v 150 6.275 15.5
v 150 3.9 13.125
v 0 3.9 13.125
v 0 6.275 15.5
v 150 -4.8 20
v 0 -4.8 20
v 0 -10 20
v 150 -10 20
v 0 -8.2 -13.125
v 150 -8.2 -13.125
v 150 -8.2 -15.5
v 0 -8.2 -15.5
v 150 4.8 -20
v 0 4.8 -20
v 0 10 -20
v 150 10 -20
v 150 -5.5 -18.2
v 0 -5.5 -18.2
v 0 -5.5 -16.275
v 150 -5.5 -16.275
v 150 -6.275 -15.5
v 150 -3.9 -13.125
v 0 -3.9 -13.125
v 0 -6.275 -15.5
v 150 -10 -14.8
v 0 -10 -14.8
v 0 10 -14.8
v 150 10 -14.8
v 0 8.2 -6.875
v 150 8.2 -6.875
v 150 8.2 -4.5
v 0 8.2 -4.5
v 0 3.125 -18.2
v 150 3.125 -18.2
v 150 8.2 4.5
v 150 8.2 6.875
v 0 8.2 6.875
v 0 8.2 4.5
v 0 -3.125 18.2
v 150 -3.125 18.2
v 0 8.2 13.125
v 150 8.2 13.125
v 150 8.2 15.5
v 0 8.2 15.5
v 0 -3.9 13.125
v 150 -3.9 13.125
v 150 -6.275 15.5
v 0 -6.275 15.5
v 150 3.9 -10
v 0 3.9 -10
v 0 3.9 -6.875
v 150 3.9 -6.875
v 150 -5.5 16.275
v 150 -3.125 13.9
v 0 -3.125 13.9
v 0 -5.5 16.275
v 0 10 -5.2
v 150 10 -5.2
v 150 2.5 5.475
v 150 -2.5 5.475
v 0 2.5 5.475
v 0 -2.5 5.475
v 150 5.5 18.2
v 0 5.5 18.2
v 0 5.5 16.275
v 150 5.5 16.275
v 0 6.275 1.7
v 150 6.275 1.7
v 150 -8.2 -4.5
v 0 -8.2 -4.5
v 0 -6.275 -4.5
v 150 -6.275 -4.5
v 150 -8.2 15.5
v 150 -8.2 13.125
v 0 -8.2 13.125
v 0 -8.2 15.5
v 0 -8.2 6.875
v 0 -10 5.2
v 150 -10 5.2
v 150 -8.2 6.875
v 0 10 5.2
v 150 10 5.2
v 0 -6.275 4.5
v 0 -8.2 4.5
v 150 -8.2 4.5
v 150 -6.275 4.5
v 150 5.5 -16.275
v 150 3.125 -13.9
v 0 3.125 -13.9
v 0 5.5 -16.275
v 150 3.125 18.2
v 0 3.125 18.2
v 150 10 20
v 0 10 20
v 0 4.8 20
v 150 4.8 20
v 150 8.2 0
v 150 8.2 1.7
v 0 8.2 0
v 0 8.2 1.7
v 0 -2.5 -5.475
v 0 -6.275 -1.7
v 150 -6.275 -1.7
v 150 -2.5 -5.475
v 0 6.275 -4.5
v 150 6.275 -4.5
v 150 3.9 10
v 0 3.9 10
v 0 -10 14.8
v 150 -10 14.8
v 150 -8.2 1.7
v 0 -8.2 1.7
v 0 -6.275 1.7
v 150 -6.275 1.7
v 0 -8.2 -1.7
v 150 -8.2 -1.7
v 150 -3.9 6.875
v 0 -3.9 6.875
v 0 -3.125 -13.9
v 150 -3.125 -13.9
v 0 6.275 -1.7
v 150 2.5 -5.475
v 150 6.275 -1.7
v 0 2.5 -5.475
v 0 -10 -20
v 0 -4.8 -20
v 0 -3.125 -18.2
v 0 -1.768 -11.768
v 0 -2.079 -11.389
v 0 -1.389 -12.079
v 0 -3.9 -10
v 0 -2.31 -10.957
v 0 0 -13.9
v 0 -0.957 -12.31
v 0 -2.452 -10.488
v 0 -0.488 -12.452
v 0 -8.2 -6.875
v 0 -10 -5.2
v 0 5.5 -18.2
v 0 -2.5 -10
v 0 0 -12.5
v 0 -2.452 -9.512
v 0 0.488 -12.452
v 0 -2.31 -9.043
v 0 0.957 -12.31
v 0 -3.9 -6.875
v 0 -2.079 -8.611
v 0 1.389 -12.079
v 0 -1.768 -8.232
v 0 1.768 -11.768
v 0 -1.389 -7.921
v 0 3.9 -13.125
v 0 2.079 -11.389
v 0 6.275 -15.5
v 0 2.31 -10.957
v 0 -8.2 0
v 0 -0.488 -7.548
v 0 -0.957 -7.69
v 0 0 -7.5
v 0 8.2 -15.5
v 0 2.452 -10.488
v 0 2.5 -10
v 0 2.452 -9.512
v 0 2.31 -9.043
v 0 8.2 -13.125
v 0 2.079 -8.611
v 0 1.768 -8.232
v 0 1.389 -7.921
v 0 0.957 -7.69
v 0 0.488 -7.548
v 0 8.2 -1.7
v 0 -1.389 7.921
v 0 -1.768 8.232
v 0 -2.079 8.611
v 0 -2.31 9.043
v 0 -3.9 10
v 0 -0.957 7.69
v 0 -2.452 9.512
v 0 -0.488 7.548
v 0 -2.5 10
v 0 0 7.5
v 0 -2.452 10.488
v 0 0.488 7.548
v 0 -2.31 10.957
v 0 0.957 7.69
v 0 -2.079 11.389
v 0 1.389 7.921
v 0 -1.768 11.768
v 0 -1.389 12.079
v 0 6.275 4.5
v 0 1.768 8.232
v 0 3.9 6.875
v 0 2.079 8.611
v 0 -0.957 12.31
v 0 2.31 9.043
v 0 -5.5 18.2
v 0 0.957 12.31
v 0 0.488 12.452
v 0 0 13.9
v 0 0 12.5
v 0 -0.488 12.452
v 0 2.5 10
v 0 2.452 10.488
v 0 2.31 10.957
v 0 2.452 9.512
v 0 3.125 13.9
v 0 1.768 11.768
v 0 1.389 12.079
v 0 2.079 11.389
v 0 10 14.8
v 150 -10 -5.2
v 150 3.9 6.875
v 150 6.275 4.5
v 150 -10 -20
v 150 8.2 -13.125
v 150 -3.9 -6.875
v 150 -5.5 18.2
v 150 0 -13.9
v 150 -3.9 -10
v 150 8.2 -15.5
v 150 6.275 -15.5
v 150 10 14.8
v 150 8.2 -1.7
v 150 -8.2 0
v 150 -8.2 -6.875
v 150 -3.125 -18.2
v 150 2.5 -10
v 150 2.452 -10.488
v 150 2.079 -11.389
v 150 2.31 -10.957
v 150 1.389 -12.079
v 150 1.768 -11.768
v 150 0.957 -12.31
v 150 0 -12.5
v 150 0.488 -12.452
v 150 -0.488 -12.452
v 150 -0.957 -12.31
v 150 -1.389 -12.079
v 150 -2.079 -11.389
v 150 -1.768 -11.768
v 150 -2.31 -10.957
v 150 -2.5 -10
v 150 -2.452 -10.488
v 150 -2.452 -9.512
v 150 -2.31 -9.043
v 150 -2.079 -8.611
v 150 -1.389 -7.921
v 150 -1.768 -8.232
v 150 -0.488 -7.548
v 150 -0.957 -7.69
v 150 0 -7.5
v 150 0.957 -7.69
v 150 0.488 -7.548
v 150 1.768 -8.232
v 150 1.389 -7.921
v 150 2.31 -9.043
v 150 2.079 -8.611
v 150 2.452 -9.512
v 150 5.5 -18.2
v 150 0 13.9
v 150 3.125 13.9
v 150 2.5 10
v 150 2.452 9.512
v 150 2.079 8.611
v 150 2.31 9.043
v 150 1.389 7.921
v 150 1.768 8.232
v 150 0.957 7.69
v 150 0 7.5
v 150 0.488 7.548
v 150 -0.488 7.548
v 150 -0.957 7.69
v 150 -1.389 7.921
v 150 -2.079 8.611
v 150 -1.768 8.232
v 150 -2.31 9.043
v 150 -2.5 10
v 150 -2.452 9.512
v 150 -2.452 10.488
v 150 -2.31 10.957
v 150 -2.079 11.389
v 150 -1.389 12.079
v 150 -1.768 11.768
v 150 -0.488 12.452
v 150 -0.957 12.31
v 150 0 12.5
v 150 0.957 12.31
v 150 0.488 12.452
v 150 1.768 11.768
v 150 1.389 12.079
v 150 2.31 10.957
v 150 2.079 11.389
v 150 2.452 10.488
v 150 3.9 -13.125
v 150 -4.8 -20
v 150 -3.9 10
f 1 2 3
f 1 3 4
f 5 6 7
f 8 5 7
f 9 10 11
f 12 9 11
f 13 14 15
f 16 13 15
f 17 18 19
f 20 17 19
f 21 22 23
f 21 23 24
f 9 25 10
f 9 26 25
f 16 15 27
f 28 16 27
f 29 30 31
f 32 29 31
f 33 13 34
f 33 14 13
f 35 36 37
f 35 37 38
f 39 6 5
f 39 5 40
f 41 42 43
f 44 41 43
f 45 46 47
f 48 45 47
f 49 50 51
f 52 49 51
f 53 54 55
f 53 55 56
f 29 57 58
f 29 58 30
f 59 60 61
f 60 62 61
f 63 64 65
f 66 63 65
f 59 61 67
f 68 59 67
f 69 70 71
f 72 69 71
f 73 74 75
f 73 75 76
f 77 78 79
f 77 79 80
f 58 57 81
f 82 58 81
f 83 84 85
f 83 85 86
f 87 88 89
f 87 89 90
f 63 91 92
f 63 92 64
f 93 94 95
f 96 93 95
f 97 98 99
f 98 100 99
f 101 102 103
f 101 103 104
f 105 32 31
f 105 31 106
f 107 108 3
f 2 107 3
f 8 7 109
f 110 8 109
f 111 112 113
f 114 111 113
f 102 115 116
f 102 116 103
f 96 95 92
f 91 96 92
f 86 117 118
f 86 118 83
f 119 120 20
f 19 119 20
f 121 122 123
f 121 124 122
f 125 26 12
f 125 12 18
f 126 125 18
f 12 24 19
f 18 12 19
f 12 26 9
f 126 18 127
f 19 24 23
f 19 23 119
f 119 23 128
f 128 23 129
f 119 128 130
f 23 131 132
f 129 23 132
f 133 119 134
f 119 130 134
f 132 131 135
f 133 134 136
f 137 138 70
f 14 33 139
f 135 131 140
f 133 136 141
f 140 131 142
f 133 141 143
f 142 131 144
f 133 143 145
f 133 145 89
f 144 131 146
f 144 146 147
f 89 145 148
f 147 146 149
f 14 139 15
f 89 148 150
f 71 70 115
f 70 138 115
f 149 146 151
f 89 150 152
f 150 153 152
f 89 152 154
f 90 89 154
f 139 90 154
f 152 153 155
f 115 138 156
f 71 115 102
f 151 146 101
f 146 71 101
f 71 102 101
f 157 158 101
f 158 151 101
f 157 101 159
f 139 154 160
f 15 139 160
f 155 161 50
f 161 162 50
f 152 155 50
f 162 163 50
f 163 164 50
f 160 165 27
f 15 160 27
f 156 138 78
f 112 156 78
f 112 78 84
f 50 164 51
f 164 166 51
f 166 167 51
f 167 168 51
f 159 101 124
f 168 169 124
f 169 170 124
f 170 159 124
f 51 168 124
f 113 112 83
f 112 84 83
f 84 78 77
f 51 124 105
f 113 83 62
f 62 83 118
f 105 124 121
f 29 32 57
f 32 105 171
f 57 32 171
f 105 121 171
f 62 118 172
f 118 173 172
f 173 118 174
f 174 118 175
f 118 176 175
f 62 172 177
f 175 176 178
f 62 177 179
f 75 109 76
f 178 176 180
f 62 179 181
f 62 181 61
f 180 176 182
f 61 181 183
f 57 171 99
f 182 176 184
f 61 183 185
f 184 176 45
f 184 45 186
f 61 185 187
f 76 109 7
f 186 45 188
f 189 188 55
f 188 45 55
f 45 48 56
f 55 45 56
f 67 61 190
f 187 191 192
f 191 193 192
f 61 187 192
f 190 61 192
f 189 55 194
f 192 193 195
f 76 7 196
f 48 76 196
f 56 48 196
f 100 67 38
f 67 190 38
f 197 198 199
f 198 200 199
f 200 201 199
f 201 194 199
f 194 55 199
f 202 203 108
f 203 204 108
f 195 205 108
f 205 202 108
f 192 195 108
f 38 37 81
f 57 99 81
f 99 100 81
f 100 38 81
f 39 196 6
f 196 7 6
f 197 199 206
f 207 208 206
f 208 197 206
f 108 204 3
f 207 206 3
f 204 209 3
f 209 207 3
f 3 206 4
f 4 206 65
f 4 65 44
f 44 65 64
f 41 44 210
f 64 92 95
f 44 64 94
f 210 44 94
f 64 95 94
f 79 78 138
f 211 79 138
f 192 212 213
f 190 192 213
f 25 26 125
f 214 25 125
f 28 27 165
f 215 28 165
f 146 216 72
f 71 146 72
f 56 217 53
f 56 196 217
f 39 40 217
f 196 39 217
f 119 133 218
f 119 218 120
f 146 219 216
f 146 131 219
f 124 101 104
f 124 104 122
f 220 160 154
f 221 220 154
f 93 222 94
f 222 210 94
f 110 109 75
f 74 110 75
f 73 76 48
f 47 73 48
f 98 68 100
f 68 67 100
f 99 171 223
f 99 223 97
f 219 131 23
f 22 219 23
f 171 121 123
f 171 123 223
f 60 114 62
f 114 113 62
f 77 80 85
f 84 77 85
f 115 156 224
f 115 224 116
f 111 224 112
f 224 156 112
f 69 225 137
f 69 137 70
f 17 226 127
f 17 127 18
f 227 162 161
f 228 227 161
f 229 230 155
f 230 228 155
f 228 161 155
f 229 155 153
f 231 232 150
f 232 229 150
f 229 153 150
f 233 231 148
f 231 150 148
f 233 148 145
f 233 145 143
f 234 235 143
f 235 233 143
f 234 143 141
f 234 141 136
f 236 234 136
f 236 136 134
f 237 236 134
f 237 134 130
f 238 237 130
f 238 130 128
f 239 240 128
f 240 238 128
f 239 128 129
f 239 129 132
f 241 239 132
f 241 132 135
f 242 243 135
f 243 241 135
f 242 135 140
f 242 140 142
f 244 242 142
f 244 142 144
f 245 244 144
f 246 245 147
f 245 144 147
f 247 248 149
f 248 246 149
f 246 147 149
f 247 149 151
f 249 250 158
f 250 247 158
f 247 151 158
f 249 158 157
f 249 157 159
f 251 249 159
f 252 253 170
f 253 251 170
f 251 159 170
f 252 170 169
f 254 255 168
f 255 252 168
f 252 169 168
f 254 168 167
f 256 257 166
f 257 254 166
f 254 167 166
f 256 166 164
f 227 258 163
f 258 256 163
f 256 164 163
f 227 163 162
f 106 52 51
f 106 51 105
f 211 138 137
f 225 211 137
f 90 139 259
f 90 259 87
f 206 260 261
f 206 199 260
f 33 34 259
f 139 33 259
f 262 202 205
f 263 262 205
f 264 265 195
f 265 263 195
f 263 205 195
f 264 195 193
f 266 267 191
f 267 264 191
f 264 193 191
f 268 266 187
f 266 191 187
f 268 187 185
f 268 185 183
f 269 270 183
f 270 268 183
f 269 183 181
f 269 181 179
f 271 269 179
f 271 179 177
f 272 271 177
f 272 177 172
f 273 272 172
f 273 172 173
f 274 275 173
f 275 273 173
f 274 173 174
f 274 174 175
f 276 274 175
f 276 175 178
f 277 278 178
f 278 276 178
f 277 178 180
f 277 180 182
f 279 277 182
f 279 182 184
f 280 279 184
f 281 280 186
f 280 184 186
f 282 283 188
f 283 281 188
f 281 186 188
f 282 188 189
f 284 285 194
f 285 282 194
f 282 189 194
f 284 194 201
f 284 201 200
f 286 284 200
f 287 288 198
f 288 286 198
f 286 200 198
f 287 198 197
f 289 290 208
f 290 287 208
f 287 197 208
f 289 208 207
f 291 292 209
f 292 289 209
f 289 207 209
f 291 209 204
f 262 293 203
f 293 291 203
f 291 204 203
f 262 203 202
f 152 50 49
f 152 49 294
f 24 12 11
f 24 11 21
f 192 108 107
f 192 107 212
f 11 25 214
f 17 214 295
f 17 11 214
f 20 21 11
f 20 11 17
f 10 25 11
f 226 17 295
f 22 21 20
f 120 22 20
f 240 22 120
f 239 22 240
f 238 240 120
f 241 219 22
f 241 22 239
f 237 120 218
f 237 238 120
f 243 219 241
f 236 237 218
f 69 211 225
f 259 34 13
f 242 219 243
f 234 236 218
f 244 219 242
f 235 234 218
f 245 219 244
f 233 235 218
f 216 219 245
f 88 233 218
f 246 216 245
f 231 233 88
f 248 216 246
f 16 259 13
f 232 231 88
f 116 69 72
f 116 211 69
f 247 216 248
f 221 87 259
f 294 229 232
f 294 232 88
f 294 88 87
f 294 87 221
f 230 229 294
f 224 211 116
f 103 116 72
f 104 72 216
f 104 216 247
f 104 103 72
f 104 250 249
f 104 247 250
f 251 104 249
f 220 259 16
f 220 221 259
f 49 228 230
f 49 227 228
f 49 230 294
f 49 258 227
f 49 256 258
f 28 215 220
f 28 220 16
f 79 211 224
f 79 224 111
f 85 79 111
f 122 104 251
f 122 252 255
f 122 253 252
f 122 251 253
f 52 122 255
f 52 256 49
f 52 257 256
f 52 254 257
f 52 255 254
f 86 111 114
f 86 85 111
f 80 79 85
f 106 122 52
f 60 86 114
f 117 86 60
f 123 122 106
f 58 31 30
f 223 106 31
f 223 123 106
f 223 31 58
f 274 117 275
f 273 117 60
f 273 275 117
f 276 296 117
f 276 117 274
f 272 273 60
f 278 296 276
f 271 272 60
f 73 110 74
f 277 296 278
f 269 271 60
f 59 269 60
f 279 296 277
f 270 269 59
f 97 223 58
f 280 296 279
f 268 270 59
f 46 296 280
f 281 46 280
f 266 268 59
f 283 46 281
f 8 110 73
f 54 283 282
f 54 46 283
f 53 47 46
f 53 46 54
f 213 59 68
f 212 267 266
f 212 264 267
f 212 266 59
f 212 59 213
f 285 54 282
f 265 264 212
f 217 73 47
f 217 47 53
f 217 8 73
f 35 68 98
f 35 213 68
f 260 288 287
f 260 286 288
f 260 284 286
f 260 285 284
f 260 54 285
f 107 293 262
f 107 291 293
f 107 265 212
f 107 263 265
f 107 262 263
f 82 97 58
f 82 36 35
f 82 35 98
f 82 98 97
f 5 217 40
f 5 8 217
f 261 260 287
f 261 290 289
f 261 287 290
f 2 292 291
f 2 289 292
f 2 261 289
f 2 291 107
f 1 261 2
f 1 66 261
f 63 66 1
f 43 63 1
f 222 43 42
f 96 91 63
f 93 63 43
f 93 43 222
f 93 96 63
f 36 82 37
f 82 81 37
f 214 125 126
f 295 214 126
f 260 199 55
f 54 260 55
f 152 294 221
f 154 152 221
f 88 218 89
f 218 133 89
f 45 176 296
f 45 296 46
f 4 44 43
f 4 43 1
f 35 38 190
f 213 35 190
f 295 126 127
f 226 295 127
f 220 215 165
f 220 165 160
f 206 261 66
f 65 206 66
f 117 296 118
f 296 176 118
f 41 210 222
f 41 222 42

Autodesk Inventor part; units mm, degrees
ref_plane "YZ Plane" through (0, 0, 0) normal (1, 0, 0) x (0, 1, 0)
ref_plane "XZ Plane" through (0, 0, 0) normal (0, 1, 0) x (-1, 0, 0)
ref_plane "XY Plane" through (0, 0, 0) normal (0, 0, 1) x (1, 0, 0)
sketch "Sketch1" plane through (0, 0, 0) normal (1, 0, 0) x (0, 1, 0)
  line L0 (10, 20) -> (-10, 20)
  line L1 (-10, 20) -> (-10, -20)
  line L2 (-10, -20) -> (10, -20)
  line L3 (10, -20) -> (10, 20)
  line L4 (10, 20) -> (-10, -20) construction
  line L5 (-10, 20) -> (10, -20) construction
  line L6 (0, -20) -> (0, -10) construction
  circle A0 centre (0, -10) radius 2.5
  line L7 (10, 0) -> (0, 0) construction
  circle A1 centre (0, 10) radius 2.5
  line L8 (0, 20) -> (0, 18.2) construction
  line L9 (0, 18.2) -> (3.125, 18.2)
  line L10 (0, 18.2) -> (0, 13.9)
  line L11 (0, 20) -> (4.8, 20)
  line L12 (4.8, 20) -> (3.125, 18.2)
  line L13 (0, 18.2) -> (5.5, 18.2)
  line L14 (0, 13.9) -> (3.125, 13.9)
  line L15 (5.5, 18.2) -> (5.5, 16.275)
  line L16 (3.125, 13.9) -> (5.5, 16.275)
  line L17 (3.125, 13.9) -> (8.7353, 13.9) construction
  line L18 (0, 18.2) -> (-3.125, 18.2)
  line L19 (0, 20) -> (-4.8, 20)
  line L20 (-4.8, 20) -> (-3.125, 18.2)
  line L21 (0, 18.2) -> (-5.5, 18.2)
  line L22 (0, 13.9) -> (-3.125, 13.9)
  line L23 (-5.5, 18.2) -> (-5.5, 16.275)
  line L24 (-3.125, 13.9) -> (-5.5, 16.275)
  line L25 (10, 10) -> (8.2, 10) construction
  line L26 (8.2, 10) -> (8.2, 6.875)
  line L27 (8.2, 10) -> (3.9, 10)
  line L28 (10, 10) -> (10, 5.2)
  line L29 (10, 5.2) -> (8.2, 6.875)
  line L30 (8.2, 10) -> (8.2, 4.5)
  line L31 (3.9, 10) -> (3.9, 6.875)
  line L32 (8.2, 4.5) -> (6.275, 4.5)
  line L33 (3.9, 6.875) -> (6.275, 4.5)
  line L34 (3.9, 13.125) -> (6.275, 15.5)
  line L35 (8.2, 10) -> (8.2, 15.5)
  line L36 (8.2, 15.5) -> (6.275, 15.5)
  line L37 (8.2, 10) -> (8.2, 13.125)
  line L38 (10, 10) -> (10, 14.8)
  line L39 (10, 14.8) -> (8.2, 13.125)
  line L40 (3.9, 10) -> (3.9, 13.125)
  line L41 (0, 10) -> (10, 10) construction
  line L42 (-3.9, 10) -> (-3.9, 13.125)
  line L43 (-3.9, 13.125) -> (-6.275, 15.5)
  line L44 (-8.2, 10) -> (-8.2, 15.5)
  line L45 (-8.2, 15.5) -> (-6.275, 15.5)
  line L46 (-10, 14.8) -> (-8.2, 13.125)
  line L47 (-3.9, 10) -> (-3.9, 6.875)
  line L48 (-3.9, 6.875) -> (-6.275, 4.5)
  line L49 (-8.2, 4.5) -> (-6.275, 4.5)
  line L50 (-8.2, 10) -> (-8.2, 4.5)
  line L51 (-10, 5.2) -> (-8.2, 6.875)
  line L52 (0, -20) -> (0, -18.2) construction
  line L53 (0, -18.2) -> (3.125, -18.2)
  line L54 (0, -18.2) -> (0, -13.9)
  line L55 (0, -20) -> (4.8, -20)
  line L56 (4.8, -20) -> (3.125, -18.2)
  line L57 (0, -18.2) -> (5.5, -18.2)
  line L58 (0, -13.9) -> (3.125, -13.9)
  line L59 (5.5, -18.2) -> (5.5, -16.275)
  line L60 (3.125, -13.9) -> (5.5, -16.275)
  line L61 (3.125, -13.9) -> (8.7353, -13.9) construction
  line L62 (-3.125, -13.9) -> (-5.5, -16.275)
  line L63 (0, -18.2) -> (-5.5, -18.2)
  line L64 (-5.5, -18.2) -> (-5.5, -16.275)
  line L65 (0, -18.2) -> (-3.125, -18.2)
  line L66 (0, -20) -> (-4.8, -20)
  line L67 (-4.8, -20) -> (-3.125, -18.2)
  line L68 (0, -13.9) -> (-3.125, -13.9)
  line L69 (8.2, -10) -> (8.2, -13.125)
  line L70 (3.9, -10) -> (3.9, -13.125)
  line L71 (3.9, -13.125) -> (6.275, -15.5)
  line L72 (10, -10) -> (10, -14.8)
  line L73 (8.2, -10) -> (8.2, -15.5)
  line L74 (8.2, -15.5) -> (6.275, -15.5)
  line L75 (10, -14.8) -> (8.2, -13.125)
  line L76 (3.9, -10) -> (3.9, -6.875)
  line L77 (3.9, -6.875) -> (6.275, -4.5)
  line L78 (8.2, -4.5) -> (6.275, -4.5)
  line L79 (8.2, -10) -> (3.9, -10)
  line L80 (8.2, -10) -> (8.2, -6.875)
  line L81 (8.2, -10) -> (8.2, -4.5)
  line L82 (10, -5.2) -> (8.2, -6.875)
  line L83 (10, -10) -> (10, -5.2)
  line L84 (10, -10) -> (8.2, -10) construction
  line L85 (-10, -14.8) -> (-8.2, -13.125)
  line L86 (-8.2, -10) -> (-8.2, -15.5)
  line L87 (-8.2, -15.5) -> (-6.275, -15.5)
  line L88 (-3.9, -13.125) -> (-6.275, -15.5)
  line L89 (-3.9, -10) -> (-3.9, -13.125)
  line L90 (-3.9, -10) -> (-3.9, -6.875)
  line L91 (-3.9, -6.875) -> (-6.275, -4.5)
  line L92 (-8.2, -4.5) -> (-6.275, -4.5)
  line L93 (-8.2, -10) -> (-8.2, -4.5)
  line L94 (-10, -5.2) -> (-8.2, -6.875)
  line L95 (-8.2, -4.5) -> (-8.2, 0) construction
  line L96 (-8.2, 0) -> (-8.2, 1.7)
  line L97 (-8.2, 1.7) -> (-6.275, 1.7)
  line L98 (-6.275, 1.7) -> (-2.5, 5.475)
  line L99 (-3.9, 6.875) -> (-1.2394, 4.2144) construction
  line L100 (-2.5, 5.475) -> (2.5, 5.475)
  line L101 (3.9, 6.875) -> (1.5625, 4.5375) construction
  line L102 (-6.275, 1.7) -> (13.7612, 1.7) construction
  line L103 (-6.275, 1.7) -> (13.7612, 1.7) construction
  line L104 (2.5, 5.475) -> (6.275, 1.7)
  line L105 (6.275, 1.7) -> (8.2, 1.7)
  line L106 (8.2, 1.7) -> (8.2, 0)
  line L107 (-8.2, 0) -> (-8.2, -1.7)
  line L108 (-8.2, -1.7) -> (-6.275, -1.7)
  line L109 (-6.275, -1.7) -> (-2.5, -5.475)
  line L110 (-2.5, -5.475) -> (2.5, -5.475)
  line L111 (2.5, -5.475) -> (6.275, -1.7)
  line L112 (6.275, -1.7) -> (8.2, -1.7)
  line L113 (8.2, -1.7) -> (8.2, 0)
  point P0 (10, -10)
  dimension "d0" = 20
  dimension "d1" = 40
  dimension "d2" = 10
  dimension "d3" = 5
  dimension "d4" = 10
  dimension "d5" = 1.8
  dimension "d6" = 3.125
  dimension "d7" = 4.3
  dimension "d9" = 4.8
  dimension "d11" = 5.5
  dimension "d12" = 3.125
  dimension "d13" = 45
  dimension "d14" = 1.8
  dimension "d15" = 3.125
  dimension "d16" = 4.3
  dimension "d17" = 4.8
  dimension "d18" = 5.5
  dimension "d19" = 3.125
  dimension "d20" = 1.7
  dimension "d21" = 0
extrude "Extrusion1" add sketch "Sketch1" along normal blind 150 contours L3 L39 L35 L36 L34 L40 L31 L33 L32 L30 L29 L82 L81 L78 L77 L76 L70 L71 L74 L73 L75 L2 L56 L57 L59 L60 L58 L68 L62 L64 L63 L67 L1 L85 L86 L87 L88 L89 L90 L91 L92 L93 L94 L51 L50 L49 L48 L47 L42 L43 L45 L44 L46 L0 L20 L21 L23 L24 L22 L14 L16 L15 L13 L12
properties part number "VSLOT"
